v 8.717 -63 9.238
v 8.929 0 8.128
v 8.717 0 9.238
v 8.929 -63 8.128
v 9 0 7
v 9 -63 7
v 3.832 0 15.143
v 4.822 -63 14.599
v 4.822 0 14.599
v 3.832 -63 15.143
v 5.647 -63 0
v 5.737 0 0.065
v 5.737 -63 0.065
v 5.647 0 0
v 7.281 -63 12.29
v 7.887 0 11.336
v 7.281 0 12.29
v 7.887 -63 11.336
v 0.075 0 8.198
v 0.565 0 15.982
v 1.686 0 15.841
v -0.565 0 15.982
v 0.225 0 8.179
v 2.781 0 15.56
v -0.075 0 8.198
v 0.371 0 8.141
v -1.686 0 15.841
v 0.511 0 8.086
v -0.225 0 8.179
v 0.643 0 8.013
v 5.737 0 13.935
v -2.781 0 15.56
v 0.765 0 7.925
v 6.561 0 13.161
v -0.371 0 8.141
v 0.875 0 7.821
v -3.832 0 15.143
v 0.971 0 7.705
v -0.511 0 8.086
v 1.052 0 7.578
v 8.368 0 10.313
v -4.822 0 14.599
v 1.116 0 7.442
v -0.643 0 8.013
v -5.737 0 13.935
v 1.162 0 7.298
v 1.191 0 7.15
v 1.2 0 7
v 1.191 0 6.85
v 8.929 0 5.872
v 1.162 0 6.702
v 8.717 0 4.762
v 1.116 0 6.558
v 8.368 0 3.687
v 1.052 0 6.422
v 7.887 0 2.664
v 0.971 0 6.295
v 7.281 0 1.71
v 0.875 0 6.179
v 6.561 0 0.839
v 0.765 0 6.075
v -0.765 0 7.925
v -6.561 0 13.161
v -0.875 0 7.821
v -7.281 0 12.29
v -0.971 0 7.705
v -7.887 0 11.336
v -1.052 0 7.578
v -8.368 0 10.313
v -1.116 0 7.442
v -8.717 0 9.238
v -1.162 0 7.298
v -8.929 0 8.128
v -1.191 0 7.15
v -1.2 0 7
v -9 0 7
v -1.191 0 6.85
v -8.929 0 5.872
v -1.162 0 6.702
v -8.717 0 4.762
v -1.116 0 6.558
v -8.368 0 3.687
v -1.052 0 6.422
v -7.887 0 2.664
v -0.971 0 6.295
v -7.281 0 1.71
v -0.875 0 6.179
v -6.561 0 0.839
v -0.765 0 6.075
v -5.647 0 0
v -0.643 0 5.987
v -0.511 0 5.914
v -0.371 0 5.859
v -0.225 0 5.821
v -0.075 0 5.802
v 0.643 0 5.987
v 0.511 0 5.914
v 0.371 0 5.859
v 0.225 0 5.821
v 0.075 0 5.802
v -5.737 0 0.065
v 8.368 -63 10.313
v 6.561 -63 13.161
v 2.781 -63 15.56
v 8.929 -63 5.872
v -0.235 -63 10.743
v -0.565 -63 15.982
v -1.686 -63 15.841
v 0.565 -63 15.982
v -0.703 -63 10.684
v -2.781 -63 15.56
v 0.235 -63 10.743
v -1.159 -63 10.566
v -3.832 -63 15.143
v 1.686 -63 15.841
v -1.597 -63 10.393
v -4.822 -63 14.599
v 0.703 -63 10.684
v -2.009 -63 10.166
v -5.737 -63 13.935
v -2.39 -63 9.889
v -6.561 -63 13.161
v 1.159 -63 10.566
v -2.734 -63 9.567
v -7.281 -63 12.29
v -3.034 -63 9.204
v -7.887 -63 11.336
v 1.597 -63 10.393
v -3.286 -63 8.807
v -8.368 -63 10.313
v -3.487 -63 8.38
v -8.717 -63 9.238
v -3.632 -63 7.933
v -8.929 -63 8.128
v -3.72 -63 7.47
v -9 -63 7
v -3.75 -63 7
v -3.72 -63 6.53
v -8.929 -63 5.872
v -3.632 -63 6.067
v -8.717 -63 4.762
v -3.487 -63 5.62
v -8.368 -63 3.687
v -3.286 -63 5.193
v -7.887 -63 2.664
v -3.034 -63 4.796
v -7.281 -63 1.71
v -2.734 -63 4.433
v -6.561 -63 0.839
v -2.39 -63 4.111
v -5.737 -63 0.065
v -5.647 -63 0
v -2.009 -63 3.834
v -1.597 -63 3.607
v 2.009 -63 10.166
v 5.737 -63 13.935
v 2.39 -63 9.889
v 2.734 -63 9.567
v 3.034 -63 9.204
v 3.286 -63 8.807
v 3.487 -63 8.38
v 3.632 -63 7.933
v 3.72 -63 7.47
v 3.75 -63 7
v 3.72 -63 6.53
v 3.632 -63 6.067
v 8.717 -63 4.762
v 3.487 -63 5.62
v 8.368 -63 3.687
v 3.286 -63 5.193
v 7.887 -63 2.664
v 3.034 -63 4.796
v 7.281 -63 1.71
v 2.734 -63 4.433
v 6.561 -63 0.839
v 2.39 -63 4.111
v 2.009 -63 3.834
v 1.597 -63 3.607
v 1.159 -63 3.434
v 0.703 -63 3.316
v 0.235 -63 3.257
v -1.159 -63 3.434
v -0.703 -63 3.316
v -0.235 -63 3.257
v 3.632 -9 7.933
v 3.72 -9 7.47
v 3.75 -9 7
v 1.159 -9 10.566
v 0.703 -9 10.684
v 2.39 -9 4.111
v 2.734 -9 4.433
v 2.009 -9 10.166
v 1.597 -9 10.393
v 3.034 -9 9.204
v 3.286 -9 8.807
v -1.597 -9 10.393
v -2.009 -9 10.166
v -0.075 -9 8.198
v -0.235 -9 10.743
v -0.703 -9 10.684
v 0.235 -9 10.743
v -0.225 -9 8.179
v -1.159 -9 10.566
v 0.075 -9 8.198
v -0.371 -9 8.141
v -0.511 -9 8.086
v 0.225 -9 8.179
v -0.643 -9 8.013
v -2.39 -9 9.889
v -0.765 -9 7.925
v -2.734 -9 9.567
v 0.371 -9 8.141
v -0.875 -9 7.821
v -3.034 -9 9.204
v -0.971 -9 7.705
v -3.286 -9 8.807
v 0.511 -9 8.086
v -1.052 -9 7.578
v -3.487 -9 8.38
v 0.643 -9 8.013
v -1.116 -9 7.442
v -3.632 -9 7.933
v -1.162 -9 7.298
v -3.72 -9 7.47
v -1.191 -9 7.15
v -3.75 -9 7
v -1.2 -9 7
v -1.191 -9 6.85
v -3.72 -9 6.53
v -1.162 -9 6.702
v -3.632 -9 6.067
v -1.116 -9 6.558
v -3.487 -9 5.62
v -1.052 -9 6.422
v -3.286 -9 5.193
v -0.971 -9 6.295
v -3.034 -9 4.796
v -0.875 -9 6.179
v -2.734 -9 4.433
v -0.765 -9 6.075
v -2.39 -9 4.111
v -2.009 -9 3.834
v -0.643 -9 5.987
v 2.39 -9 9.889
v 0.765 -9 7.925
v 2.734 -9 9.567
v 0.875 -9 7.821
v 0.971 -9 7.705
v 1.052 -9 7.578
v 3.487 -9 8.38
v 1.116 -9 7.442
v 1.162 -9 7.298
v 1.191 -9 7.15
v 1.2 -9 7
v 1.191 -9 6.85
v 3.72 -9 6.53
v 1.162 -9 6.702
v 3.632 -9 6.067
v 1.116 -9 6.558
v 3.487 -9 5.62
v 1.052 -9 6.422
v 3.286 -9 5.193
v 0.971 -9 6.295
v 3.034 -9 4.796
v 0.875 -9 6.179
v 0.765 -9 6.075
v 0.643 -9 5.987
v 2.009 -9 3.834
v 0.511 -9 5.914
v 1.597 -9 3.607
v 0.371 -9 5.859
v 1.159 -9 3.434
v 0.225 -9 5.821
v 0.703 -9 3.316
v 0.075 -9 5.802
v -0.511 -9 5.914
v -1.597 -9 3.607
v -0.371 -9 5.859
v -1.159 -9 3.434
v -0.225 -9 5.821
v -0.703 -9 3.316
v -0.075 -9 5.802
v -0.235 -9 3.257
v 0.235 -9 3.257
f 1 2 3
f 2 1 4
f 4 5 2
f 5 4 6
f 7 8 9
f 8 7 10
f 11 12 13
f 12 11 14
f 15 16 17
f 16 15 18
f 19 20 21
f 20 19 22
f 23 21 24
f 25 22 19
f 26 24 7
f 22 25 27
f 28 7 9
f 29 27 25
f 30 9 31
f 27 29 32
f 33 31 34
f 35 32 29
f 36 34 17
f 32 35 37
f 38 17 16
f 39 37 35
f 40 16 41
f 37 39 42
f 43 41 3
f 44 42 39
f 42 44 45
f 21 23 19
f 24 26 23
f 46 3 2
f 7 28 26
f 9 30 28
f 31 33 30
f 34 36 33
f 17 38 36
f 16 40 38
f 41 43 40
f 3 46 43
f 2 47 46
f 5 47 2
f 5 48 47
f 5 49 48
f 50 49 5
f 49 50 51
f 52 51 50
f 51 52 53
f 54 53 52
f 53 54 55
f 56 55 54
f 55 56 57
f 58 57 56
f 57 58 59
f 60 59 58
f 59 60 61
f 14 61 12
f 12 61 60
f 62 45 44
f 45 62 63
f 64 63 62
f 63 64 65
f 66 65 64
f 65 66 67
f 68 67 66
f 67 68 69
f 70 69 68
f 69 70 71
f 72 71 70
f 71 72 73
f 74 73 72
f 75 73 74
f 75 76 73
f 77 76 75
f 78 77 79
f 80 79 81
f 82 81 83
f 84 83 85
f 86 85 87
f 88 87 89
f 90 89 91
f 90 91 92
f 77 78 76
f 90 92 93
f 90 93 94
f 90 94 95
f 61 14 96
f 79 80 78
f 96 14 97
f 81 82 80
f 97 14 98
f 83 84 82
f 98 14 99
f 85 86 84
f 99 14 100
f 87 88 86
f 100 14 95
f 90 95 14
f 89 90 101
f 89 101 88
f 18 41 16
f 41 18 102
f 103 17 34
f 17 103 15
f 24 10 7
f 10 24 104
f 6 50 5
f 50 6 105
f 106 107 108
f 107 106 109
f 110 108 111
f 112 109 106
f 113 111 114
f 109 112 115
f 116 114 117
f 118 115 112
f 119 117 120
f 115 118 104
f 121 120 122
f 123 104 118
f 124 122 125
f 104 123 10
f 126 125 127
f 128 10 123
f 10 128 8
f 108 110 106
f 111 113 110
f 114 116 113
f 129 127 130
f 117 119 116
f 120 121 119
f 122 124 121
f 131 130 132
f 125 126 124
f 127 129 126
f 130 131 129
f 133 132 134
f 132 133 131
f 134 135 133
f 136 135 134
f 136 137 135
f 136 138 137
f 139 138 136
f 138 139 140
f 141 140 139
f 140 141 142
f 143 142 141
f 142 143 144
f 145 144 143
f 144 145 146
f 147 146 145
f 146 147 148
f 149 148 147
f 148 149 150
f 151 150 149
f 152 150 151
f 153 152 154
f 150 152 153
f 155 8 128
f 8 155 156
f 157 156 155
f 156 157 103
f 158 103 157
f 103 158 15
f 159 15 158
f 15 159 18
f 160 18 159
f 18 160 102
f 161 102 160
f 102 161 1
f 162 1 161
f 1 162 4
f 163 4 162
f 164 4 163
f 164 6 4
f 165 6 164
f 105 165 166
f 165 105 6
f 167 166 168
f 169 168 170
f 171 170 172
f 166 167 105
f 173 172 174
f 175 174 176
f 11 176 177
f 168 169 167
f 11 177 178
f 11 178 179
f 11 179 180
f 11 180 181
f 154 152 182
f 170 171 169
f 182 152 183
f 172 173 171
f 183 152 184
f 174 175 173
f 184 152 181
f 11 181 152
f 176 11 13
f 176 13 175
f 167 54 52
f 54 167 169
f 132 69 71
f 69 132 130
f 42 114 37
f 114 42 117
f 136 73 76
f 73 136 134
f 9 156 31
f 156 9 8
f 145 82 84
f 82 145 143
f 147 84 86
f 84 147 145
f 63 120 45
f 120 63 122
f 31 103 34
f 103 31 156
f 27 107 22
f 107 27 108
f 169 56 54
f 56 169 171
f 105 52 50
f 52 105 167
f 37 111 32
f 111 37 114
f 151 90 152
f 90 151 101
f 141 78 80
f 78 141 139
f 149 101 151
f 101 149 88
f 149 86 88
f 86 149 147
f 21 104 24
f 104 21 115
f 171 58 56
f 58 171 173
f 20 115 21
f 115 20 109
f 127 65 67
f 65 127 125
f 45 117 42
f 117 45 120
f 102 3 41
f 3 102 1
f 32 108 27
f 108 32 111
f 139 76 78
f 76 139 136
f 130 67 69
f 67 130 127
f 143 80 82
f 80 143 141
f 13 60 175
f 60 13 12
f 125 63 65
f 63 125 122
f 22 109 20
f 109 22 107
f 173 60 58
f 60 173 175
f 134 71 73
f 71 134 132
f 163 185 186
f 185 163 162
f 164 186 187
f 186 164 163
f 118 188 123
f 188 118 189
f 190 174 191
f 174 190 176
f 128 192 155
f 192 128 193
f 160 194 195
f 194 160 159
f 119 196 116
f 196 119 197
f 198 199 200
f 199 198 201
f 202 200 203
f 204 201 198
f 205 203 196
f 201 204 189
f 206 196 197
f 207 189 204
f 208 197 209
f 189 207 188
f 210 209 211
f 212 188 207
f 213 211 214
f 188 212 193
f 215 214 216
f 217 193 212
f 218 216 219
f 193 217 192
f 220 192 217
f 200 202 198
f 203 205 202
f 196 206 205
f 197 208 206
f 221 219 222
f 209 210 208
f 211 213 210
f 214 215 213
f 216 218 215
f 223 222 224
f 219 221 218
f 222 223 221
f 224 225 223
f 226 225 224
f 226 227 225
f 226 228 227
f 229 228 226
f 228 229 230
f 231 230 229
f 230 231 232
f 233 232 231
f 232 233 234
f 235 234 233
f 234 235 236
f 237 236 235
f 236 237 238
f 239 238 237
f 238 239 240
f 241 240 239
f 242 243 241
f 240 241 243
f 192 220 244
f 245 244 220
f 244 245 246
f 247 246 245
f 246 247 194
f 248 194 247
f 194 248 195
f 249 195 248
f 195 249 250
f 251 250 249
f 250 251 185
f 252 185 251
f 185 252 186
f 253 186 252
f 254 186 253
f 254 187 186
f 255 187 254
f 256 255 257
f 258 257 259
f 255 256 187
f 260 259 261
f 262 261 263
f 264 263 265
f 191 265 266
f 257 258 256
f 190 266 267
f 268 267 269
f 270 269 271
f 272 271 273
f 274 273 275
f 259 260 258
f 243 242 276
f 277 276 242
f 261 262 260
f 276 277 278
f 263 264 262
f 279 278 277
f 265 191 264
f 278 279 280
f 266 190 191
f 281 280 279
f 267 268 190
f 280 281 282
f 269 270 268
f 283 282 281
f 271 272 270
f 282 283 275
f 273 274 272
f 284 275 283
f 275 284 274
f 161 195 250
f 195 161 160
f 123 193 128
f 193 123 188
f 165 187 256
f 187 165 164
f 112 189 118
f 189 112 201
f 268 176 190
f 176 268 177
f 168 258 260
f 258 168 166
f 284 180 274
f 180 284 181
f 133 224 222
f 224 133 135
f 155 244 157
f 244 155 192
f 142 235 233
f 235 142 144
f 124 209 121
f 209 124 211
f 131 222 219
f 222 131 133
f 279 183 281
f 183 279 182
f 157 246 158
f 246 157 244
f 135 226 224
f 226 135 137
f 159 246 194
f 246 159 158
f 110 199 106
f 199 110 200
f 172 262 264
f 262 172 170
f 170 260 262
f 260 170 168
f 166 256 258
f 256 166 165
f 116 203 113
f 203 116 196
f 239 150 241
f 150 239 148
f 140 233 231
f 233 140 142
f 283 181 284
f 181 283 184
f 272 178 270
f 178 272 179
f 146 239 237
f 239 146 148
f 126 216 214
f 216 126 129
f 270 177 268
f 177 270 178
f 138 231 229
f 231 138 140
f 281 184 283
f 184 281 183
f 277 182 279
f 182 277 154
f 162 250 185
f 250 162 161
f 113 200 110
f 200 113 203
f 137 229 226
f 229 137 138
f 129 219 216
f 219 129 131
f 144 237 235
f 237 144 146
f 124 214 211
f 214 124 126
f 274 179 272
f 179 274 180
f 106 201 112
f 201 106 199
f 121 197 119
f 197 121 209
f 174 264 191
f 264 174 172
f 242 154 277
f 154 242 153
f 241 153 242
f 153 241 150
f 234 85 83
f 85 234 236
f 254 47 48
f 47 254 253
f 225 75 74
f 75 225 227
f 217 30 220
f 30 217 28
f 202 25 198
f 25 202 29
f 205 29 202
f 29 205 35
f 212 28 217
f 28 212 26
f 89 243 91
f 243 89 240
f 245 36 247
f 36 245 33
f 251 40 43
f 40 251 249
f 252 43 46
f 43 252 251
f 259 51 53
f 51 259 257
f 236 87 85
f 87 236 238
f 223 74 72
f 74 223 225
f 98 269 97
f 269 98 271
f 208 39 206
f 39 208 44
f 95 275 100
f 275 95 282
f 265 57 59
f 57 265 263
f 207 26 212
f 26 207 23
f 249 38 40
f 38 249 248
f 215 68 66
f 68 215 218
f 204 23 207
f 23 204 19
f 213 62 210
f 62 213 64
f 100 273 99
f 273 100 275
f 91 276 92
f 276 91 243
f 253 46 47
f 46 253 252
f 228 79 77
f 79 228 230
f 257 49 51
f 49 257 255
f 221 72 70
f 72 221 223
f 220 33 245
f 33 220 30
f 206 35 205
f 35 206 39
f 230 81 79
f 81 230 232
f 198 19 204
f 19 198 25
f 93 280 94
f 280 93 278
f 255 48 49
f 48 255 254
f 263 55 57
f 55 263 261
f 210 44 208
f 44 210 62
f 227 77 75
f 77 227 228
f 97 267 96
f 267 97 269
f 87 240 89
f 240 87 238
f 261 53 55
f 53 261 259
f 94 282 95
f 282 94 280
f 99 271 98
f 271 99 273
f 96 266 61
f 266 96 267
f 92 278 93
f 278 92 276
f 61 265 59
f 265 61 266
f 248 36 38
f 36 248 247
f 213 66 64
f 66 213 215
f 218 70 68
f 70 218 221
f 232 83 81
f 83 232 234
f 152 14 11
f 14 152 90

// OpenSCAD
$fn = 50;

shaft_od = 18;
length = 63;

screw_hole_id = 2.4;
screw_head_hole_id = 7.5;
screw_depth = 9;

module basic() {
  difference() {
    cylinder(d=shaft_od, h=length);
      
    translate([0, 0, screw_depth])
      cylinder(d=screw_head_hole_id, h=1000);
    
    translate([0, 0, -1])
      cylinder(d=screw_hole_id, h=1000);
  }
}

module tipped() {
  intersection() {
    translate([0, 0, shaft_od/2 - 2])
      rotate([90, 0, 0])
        basic();
    translate([0, 0, 100])
      cube(200, center=true);
  }
}

tipped();
